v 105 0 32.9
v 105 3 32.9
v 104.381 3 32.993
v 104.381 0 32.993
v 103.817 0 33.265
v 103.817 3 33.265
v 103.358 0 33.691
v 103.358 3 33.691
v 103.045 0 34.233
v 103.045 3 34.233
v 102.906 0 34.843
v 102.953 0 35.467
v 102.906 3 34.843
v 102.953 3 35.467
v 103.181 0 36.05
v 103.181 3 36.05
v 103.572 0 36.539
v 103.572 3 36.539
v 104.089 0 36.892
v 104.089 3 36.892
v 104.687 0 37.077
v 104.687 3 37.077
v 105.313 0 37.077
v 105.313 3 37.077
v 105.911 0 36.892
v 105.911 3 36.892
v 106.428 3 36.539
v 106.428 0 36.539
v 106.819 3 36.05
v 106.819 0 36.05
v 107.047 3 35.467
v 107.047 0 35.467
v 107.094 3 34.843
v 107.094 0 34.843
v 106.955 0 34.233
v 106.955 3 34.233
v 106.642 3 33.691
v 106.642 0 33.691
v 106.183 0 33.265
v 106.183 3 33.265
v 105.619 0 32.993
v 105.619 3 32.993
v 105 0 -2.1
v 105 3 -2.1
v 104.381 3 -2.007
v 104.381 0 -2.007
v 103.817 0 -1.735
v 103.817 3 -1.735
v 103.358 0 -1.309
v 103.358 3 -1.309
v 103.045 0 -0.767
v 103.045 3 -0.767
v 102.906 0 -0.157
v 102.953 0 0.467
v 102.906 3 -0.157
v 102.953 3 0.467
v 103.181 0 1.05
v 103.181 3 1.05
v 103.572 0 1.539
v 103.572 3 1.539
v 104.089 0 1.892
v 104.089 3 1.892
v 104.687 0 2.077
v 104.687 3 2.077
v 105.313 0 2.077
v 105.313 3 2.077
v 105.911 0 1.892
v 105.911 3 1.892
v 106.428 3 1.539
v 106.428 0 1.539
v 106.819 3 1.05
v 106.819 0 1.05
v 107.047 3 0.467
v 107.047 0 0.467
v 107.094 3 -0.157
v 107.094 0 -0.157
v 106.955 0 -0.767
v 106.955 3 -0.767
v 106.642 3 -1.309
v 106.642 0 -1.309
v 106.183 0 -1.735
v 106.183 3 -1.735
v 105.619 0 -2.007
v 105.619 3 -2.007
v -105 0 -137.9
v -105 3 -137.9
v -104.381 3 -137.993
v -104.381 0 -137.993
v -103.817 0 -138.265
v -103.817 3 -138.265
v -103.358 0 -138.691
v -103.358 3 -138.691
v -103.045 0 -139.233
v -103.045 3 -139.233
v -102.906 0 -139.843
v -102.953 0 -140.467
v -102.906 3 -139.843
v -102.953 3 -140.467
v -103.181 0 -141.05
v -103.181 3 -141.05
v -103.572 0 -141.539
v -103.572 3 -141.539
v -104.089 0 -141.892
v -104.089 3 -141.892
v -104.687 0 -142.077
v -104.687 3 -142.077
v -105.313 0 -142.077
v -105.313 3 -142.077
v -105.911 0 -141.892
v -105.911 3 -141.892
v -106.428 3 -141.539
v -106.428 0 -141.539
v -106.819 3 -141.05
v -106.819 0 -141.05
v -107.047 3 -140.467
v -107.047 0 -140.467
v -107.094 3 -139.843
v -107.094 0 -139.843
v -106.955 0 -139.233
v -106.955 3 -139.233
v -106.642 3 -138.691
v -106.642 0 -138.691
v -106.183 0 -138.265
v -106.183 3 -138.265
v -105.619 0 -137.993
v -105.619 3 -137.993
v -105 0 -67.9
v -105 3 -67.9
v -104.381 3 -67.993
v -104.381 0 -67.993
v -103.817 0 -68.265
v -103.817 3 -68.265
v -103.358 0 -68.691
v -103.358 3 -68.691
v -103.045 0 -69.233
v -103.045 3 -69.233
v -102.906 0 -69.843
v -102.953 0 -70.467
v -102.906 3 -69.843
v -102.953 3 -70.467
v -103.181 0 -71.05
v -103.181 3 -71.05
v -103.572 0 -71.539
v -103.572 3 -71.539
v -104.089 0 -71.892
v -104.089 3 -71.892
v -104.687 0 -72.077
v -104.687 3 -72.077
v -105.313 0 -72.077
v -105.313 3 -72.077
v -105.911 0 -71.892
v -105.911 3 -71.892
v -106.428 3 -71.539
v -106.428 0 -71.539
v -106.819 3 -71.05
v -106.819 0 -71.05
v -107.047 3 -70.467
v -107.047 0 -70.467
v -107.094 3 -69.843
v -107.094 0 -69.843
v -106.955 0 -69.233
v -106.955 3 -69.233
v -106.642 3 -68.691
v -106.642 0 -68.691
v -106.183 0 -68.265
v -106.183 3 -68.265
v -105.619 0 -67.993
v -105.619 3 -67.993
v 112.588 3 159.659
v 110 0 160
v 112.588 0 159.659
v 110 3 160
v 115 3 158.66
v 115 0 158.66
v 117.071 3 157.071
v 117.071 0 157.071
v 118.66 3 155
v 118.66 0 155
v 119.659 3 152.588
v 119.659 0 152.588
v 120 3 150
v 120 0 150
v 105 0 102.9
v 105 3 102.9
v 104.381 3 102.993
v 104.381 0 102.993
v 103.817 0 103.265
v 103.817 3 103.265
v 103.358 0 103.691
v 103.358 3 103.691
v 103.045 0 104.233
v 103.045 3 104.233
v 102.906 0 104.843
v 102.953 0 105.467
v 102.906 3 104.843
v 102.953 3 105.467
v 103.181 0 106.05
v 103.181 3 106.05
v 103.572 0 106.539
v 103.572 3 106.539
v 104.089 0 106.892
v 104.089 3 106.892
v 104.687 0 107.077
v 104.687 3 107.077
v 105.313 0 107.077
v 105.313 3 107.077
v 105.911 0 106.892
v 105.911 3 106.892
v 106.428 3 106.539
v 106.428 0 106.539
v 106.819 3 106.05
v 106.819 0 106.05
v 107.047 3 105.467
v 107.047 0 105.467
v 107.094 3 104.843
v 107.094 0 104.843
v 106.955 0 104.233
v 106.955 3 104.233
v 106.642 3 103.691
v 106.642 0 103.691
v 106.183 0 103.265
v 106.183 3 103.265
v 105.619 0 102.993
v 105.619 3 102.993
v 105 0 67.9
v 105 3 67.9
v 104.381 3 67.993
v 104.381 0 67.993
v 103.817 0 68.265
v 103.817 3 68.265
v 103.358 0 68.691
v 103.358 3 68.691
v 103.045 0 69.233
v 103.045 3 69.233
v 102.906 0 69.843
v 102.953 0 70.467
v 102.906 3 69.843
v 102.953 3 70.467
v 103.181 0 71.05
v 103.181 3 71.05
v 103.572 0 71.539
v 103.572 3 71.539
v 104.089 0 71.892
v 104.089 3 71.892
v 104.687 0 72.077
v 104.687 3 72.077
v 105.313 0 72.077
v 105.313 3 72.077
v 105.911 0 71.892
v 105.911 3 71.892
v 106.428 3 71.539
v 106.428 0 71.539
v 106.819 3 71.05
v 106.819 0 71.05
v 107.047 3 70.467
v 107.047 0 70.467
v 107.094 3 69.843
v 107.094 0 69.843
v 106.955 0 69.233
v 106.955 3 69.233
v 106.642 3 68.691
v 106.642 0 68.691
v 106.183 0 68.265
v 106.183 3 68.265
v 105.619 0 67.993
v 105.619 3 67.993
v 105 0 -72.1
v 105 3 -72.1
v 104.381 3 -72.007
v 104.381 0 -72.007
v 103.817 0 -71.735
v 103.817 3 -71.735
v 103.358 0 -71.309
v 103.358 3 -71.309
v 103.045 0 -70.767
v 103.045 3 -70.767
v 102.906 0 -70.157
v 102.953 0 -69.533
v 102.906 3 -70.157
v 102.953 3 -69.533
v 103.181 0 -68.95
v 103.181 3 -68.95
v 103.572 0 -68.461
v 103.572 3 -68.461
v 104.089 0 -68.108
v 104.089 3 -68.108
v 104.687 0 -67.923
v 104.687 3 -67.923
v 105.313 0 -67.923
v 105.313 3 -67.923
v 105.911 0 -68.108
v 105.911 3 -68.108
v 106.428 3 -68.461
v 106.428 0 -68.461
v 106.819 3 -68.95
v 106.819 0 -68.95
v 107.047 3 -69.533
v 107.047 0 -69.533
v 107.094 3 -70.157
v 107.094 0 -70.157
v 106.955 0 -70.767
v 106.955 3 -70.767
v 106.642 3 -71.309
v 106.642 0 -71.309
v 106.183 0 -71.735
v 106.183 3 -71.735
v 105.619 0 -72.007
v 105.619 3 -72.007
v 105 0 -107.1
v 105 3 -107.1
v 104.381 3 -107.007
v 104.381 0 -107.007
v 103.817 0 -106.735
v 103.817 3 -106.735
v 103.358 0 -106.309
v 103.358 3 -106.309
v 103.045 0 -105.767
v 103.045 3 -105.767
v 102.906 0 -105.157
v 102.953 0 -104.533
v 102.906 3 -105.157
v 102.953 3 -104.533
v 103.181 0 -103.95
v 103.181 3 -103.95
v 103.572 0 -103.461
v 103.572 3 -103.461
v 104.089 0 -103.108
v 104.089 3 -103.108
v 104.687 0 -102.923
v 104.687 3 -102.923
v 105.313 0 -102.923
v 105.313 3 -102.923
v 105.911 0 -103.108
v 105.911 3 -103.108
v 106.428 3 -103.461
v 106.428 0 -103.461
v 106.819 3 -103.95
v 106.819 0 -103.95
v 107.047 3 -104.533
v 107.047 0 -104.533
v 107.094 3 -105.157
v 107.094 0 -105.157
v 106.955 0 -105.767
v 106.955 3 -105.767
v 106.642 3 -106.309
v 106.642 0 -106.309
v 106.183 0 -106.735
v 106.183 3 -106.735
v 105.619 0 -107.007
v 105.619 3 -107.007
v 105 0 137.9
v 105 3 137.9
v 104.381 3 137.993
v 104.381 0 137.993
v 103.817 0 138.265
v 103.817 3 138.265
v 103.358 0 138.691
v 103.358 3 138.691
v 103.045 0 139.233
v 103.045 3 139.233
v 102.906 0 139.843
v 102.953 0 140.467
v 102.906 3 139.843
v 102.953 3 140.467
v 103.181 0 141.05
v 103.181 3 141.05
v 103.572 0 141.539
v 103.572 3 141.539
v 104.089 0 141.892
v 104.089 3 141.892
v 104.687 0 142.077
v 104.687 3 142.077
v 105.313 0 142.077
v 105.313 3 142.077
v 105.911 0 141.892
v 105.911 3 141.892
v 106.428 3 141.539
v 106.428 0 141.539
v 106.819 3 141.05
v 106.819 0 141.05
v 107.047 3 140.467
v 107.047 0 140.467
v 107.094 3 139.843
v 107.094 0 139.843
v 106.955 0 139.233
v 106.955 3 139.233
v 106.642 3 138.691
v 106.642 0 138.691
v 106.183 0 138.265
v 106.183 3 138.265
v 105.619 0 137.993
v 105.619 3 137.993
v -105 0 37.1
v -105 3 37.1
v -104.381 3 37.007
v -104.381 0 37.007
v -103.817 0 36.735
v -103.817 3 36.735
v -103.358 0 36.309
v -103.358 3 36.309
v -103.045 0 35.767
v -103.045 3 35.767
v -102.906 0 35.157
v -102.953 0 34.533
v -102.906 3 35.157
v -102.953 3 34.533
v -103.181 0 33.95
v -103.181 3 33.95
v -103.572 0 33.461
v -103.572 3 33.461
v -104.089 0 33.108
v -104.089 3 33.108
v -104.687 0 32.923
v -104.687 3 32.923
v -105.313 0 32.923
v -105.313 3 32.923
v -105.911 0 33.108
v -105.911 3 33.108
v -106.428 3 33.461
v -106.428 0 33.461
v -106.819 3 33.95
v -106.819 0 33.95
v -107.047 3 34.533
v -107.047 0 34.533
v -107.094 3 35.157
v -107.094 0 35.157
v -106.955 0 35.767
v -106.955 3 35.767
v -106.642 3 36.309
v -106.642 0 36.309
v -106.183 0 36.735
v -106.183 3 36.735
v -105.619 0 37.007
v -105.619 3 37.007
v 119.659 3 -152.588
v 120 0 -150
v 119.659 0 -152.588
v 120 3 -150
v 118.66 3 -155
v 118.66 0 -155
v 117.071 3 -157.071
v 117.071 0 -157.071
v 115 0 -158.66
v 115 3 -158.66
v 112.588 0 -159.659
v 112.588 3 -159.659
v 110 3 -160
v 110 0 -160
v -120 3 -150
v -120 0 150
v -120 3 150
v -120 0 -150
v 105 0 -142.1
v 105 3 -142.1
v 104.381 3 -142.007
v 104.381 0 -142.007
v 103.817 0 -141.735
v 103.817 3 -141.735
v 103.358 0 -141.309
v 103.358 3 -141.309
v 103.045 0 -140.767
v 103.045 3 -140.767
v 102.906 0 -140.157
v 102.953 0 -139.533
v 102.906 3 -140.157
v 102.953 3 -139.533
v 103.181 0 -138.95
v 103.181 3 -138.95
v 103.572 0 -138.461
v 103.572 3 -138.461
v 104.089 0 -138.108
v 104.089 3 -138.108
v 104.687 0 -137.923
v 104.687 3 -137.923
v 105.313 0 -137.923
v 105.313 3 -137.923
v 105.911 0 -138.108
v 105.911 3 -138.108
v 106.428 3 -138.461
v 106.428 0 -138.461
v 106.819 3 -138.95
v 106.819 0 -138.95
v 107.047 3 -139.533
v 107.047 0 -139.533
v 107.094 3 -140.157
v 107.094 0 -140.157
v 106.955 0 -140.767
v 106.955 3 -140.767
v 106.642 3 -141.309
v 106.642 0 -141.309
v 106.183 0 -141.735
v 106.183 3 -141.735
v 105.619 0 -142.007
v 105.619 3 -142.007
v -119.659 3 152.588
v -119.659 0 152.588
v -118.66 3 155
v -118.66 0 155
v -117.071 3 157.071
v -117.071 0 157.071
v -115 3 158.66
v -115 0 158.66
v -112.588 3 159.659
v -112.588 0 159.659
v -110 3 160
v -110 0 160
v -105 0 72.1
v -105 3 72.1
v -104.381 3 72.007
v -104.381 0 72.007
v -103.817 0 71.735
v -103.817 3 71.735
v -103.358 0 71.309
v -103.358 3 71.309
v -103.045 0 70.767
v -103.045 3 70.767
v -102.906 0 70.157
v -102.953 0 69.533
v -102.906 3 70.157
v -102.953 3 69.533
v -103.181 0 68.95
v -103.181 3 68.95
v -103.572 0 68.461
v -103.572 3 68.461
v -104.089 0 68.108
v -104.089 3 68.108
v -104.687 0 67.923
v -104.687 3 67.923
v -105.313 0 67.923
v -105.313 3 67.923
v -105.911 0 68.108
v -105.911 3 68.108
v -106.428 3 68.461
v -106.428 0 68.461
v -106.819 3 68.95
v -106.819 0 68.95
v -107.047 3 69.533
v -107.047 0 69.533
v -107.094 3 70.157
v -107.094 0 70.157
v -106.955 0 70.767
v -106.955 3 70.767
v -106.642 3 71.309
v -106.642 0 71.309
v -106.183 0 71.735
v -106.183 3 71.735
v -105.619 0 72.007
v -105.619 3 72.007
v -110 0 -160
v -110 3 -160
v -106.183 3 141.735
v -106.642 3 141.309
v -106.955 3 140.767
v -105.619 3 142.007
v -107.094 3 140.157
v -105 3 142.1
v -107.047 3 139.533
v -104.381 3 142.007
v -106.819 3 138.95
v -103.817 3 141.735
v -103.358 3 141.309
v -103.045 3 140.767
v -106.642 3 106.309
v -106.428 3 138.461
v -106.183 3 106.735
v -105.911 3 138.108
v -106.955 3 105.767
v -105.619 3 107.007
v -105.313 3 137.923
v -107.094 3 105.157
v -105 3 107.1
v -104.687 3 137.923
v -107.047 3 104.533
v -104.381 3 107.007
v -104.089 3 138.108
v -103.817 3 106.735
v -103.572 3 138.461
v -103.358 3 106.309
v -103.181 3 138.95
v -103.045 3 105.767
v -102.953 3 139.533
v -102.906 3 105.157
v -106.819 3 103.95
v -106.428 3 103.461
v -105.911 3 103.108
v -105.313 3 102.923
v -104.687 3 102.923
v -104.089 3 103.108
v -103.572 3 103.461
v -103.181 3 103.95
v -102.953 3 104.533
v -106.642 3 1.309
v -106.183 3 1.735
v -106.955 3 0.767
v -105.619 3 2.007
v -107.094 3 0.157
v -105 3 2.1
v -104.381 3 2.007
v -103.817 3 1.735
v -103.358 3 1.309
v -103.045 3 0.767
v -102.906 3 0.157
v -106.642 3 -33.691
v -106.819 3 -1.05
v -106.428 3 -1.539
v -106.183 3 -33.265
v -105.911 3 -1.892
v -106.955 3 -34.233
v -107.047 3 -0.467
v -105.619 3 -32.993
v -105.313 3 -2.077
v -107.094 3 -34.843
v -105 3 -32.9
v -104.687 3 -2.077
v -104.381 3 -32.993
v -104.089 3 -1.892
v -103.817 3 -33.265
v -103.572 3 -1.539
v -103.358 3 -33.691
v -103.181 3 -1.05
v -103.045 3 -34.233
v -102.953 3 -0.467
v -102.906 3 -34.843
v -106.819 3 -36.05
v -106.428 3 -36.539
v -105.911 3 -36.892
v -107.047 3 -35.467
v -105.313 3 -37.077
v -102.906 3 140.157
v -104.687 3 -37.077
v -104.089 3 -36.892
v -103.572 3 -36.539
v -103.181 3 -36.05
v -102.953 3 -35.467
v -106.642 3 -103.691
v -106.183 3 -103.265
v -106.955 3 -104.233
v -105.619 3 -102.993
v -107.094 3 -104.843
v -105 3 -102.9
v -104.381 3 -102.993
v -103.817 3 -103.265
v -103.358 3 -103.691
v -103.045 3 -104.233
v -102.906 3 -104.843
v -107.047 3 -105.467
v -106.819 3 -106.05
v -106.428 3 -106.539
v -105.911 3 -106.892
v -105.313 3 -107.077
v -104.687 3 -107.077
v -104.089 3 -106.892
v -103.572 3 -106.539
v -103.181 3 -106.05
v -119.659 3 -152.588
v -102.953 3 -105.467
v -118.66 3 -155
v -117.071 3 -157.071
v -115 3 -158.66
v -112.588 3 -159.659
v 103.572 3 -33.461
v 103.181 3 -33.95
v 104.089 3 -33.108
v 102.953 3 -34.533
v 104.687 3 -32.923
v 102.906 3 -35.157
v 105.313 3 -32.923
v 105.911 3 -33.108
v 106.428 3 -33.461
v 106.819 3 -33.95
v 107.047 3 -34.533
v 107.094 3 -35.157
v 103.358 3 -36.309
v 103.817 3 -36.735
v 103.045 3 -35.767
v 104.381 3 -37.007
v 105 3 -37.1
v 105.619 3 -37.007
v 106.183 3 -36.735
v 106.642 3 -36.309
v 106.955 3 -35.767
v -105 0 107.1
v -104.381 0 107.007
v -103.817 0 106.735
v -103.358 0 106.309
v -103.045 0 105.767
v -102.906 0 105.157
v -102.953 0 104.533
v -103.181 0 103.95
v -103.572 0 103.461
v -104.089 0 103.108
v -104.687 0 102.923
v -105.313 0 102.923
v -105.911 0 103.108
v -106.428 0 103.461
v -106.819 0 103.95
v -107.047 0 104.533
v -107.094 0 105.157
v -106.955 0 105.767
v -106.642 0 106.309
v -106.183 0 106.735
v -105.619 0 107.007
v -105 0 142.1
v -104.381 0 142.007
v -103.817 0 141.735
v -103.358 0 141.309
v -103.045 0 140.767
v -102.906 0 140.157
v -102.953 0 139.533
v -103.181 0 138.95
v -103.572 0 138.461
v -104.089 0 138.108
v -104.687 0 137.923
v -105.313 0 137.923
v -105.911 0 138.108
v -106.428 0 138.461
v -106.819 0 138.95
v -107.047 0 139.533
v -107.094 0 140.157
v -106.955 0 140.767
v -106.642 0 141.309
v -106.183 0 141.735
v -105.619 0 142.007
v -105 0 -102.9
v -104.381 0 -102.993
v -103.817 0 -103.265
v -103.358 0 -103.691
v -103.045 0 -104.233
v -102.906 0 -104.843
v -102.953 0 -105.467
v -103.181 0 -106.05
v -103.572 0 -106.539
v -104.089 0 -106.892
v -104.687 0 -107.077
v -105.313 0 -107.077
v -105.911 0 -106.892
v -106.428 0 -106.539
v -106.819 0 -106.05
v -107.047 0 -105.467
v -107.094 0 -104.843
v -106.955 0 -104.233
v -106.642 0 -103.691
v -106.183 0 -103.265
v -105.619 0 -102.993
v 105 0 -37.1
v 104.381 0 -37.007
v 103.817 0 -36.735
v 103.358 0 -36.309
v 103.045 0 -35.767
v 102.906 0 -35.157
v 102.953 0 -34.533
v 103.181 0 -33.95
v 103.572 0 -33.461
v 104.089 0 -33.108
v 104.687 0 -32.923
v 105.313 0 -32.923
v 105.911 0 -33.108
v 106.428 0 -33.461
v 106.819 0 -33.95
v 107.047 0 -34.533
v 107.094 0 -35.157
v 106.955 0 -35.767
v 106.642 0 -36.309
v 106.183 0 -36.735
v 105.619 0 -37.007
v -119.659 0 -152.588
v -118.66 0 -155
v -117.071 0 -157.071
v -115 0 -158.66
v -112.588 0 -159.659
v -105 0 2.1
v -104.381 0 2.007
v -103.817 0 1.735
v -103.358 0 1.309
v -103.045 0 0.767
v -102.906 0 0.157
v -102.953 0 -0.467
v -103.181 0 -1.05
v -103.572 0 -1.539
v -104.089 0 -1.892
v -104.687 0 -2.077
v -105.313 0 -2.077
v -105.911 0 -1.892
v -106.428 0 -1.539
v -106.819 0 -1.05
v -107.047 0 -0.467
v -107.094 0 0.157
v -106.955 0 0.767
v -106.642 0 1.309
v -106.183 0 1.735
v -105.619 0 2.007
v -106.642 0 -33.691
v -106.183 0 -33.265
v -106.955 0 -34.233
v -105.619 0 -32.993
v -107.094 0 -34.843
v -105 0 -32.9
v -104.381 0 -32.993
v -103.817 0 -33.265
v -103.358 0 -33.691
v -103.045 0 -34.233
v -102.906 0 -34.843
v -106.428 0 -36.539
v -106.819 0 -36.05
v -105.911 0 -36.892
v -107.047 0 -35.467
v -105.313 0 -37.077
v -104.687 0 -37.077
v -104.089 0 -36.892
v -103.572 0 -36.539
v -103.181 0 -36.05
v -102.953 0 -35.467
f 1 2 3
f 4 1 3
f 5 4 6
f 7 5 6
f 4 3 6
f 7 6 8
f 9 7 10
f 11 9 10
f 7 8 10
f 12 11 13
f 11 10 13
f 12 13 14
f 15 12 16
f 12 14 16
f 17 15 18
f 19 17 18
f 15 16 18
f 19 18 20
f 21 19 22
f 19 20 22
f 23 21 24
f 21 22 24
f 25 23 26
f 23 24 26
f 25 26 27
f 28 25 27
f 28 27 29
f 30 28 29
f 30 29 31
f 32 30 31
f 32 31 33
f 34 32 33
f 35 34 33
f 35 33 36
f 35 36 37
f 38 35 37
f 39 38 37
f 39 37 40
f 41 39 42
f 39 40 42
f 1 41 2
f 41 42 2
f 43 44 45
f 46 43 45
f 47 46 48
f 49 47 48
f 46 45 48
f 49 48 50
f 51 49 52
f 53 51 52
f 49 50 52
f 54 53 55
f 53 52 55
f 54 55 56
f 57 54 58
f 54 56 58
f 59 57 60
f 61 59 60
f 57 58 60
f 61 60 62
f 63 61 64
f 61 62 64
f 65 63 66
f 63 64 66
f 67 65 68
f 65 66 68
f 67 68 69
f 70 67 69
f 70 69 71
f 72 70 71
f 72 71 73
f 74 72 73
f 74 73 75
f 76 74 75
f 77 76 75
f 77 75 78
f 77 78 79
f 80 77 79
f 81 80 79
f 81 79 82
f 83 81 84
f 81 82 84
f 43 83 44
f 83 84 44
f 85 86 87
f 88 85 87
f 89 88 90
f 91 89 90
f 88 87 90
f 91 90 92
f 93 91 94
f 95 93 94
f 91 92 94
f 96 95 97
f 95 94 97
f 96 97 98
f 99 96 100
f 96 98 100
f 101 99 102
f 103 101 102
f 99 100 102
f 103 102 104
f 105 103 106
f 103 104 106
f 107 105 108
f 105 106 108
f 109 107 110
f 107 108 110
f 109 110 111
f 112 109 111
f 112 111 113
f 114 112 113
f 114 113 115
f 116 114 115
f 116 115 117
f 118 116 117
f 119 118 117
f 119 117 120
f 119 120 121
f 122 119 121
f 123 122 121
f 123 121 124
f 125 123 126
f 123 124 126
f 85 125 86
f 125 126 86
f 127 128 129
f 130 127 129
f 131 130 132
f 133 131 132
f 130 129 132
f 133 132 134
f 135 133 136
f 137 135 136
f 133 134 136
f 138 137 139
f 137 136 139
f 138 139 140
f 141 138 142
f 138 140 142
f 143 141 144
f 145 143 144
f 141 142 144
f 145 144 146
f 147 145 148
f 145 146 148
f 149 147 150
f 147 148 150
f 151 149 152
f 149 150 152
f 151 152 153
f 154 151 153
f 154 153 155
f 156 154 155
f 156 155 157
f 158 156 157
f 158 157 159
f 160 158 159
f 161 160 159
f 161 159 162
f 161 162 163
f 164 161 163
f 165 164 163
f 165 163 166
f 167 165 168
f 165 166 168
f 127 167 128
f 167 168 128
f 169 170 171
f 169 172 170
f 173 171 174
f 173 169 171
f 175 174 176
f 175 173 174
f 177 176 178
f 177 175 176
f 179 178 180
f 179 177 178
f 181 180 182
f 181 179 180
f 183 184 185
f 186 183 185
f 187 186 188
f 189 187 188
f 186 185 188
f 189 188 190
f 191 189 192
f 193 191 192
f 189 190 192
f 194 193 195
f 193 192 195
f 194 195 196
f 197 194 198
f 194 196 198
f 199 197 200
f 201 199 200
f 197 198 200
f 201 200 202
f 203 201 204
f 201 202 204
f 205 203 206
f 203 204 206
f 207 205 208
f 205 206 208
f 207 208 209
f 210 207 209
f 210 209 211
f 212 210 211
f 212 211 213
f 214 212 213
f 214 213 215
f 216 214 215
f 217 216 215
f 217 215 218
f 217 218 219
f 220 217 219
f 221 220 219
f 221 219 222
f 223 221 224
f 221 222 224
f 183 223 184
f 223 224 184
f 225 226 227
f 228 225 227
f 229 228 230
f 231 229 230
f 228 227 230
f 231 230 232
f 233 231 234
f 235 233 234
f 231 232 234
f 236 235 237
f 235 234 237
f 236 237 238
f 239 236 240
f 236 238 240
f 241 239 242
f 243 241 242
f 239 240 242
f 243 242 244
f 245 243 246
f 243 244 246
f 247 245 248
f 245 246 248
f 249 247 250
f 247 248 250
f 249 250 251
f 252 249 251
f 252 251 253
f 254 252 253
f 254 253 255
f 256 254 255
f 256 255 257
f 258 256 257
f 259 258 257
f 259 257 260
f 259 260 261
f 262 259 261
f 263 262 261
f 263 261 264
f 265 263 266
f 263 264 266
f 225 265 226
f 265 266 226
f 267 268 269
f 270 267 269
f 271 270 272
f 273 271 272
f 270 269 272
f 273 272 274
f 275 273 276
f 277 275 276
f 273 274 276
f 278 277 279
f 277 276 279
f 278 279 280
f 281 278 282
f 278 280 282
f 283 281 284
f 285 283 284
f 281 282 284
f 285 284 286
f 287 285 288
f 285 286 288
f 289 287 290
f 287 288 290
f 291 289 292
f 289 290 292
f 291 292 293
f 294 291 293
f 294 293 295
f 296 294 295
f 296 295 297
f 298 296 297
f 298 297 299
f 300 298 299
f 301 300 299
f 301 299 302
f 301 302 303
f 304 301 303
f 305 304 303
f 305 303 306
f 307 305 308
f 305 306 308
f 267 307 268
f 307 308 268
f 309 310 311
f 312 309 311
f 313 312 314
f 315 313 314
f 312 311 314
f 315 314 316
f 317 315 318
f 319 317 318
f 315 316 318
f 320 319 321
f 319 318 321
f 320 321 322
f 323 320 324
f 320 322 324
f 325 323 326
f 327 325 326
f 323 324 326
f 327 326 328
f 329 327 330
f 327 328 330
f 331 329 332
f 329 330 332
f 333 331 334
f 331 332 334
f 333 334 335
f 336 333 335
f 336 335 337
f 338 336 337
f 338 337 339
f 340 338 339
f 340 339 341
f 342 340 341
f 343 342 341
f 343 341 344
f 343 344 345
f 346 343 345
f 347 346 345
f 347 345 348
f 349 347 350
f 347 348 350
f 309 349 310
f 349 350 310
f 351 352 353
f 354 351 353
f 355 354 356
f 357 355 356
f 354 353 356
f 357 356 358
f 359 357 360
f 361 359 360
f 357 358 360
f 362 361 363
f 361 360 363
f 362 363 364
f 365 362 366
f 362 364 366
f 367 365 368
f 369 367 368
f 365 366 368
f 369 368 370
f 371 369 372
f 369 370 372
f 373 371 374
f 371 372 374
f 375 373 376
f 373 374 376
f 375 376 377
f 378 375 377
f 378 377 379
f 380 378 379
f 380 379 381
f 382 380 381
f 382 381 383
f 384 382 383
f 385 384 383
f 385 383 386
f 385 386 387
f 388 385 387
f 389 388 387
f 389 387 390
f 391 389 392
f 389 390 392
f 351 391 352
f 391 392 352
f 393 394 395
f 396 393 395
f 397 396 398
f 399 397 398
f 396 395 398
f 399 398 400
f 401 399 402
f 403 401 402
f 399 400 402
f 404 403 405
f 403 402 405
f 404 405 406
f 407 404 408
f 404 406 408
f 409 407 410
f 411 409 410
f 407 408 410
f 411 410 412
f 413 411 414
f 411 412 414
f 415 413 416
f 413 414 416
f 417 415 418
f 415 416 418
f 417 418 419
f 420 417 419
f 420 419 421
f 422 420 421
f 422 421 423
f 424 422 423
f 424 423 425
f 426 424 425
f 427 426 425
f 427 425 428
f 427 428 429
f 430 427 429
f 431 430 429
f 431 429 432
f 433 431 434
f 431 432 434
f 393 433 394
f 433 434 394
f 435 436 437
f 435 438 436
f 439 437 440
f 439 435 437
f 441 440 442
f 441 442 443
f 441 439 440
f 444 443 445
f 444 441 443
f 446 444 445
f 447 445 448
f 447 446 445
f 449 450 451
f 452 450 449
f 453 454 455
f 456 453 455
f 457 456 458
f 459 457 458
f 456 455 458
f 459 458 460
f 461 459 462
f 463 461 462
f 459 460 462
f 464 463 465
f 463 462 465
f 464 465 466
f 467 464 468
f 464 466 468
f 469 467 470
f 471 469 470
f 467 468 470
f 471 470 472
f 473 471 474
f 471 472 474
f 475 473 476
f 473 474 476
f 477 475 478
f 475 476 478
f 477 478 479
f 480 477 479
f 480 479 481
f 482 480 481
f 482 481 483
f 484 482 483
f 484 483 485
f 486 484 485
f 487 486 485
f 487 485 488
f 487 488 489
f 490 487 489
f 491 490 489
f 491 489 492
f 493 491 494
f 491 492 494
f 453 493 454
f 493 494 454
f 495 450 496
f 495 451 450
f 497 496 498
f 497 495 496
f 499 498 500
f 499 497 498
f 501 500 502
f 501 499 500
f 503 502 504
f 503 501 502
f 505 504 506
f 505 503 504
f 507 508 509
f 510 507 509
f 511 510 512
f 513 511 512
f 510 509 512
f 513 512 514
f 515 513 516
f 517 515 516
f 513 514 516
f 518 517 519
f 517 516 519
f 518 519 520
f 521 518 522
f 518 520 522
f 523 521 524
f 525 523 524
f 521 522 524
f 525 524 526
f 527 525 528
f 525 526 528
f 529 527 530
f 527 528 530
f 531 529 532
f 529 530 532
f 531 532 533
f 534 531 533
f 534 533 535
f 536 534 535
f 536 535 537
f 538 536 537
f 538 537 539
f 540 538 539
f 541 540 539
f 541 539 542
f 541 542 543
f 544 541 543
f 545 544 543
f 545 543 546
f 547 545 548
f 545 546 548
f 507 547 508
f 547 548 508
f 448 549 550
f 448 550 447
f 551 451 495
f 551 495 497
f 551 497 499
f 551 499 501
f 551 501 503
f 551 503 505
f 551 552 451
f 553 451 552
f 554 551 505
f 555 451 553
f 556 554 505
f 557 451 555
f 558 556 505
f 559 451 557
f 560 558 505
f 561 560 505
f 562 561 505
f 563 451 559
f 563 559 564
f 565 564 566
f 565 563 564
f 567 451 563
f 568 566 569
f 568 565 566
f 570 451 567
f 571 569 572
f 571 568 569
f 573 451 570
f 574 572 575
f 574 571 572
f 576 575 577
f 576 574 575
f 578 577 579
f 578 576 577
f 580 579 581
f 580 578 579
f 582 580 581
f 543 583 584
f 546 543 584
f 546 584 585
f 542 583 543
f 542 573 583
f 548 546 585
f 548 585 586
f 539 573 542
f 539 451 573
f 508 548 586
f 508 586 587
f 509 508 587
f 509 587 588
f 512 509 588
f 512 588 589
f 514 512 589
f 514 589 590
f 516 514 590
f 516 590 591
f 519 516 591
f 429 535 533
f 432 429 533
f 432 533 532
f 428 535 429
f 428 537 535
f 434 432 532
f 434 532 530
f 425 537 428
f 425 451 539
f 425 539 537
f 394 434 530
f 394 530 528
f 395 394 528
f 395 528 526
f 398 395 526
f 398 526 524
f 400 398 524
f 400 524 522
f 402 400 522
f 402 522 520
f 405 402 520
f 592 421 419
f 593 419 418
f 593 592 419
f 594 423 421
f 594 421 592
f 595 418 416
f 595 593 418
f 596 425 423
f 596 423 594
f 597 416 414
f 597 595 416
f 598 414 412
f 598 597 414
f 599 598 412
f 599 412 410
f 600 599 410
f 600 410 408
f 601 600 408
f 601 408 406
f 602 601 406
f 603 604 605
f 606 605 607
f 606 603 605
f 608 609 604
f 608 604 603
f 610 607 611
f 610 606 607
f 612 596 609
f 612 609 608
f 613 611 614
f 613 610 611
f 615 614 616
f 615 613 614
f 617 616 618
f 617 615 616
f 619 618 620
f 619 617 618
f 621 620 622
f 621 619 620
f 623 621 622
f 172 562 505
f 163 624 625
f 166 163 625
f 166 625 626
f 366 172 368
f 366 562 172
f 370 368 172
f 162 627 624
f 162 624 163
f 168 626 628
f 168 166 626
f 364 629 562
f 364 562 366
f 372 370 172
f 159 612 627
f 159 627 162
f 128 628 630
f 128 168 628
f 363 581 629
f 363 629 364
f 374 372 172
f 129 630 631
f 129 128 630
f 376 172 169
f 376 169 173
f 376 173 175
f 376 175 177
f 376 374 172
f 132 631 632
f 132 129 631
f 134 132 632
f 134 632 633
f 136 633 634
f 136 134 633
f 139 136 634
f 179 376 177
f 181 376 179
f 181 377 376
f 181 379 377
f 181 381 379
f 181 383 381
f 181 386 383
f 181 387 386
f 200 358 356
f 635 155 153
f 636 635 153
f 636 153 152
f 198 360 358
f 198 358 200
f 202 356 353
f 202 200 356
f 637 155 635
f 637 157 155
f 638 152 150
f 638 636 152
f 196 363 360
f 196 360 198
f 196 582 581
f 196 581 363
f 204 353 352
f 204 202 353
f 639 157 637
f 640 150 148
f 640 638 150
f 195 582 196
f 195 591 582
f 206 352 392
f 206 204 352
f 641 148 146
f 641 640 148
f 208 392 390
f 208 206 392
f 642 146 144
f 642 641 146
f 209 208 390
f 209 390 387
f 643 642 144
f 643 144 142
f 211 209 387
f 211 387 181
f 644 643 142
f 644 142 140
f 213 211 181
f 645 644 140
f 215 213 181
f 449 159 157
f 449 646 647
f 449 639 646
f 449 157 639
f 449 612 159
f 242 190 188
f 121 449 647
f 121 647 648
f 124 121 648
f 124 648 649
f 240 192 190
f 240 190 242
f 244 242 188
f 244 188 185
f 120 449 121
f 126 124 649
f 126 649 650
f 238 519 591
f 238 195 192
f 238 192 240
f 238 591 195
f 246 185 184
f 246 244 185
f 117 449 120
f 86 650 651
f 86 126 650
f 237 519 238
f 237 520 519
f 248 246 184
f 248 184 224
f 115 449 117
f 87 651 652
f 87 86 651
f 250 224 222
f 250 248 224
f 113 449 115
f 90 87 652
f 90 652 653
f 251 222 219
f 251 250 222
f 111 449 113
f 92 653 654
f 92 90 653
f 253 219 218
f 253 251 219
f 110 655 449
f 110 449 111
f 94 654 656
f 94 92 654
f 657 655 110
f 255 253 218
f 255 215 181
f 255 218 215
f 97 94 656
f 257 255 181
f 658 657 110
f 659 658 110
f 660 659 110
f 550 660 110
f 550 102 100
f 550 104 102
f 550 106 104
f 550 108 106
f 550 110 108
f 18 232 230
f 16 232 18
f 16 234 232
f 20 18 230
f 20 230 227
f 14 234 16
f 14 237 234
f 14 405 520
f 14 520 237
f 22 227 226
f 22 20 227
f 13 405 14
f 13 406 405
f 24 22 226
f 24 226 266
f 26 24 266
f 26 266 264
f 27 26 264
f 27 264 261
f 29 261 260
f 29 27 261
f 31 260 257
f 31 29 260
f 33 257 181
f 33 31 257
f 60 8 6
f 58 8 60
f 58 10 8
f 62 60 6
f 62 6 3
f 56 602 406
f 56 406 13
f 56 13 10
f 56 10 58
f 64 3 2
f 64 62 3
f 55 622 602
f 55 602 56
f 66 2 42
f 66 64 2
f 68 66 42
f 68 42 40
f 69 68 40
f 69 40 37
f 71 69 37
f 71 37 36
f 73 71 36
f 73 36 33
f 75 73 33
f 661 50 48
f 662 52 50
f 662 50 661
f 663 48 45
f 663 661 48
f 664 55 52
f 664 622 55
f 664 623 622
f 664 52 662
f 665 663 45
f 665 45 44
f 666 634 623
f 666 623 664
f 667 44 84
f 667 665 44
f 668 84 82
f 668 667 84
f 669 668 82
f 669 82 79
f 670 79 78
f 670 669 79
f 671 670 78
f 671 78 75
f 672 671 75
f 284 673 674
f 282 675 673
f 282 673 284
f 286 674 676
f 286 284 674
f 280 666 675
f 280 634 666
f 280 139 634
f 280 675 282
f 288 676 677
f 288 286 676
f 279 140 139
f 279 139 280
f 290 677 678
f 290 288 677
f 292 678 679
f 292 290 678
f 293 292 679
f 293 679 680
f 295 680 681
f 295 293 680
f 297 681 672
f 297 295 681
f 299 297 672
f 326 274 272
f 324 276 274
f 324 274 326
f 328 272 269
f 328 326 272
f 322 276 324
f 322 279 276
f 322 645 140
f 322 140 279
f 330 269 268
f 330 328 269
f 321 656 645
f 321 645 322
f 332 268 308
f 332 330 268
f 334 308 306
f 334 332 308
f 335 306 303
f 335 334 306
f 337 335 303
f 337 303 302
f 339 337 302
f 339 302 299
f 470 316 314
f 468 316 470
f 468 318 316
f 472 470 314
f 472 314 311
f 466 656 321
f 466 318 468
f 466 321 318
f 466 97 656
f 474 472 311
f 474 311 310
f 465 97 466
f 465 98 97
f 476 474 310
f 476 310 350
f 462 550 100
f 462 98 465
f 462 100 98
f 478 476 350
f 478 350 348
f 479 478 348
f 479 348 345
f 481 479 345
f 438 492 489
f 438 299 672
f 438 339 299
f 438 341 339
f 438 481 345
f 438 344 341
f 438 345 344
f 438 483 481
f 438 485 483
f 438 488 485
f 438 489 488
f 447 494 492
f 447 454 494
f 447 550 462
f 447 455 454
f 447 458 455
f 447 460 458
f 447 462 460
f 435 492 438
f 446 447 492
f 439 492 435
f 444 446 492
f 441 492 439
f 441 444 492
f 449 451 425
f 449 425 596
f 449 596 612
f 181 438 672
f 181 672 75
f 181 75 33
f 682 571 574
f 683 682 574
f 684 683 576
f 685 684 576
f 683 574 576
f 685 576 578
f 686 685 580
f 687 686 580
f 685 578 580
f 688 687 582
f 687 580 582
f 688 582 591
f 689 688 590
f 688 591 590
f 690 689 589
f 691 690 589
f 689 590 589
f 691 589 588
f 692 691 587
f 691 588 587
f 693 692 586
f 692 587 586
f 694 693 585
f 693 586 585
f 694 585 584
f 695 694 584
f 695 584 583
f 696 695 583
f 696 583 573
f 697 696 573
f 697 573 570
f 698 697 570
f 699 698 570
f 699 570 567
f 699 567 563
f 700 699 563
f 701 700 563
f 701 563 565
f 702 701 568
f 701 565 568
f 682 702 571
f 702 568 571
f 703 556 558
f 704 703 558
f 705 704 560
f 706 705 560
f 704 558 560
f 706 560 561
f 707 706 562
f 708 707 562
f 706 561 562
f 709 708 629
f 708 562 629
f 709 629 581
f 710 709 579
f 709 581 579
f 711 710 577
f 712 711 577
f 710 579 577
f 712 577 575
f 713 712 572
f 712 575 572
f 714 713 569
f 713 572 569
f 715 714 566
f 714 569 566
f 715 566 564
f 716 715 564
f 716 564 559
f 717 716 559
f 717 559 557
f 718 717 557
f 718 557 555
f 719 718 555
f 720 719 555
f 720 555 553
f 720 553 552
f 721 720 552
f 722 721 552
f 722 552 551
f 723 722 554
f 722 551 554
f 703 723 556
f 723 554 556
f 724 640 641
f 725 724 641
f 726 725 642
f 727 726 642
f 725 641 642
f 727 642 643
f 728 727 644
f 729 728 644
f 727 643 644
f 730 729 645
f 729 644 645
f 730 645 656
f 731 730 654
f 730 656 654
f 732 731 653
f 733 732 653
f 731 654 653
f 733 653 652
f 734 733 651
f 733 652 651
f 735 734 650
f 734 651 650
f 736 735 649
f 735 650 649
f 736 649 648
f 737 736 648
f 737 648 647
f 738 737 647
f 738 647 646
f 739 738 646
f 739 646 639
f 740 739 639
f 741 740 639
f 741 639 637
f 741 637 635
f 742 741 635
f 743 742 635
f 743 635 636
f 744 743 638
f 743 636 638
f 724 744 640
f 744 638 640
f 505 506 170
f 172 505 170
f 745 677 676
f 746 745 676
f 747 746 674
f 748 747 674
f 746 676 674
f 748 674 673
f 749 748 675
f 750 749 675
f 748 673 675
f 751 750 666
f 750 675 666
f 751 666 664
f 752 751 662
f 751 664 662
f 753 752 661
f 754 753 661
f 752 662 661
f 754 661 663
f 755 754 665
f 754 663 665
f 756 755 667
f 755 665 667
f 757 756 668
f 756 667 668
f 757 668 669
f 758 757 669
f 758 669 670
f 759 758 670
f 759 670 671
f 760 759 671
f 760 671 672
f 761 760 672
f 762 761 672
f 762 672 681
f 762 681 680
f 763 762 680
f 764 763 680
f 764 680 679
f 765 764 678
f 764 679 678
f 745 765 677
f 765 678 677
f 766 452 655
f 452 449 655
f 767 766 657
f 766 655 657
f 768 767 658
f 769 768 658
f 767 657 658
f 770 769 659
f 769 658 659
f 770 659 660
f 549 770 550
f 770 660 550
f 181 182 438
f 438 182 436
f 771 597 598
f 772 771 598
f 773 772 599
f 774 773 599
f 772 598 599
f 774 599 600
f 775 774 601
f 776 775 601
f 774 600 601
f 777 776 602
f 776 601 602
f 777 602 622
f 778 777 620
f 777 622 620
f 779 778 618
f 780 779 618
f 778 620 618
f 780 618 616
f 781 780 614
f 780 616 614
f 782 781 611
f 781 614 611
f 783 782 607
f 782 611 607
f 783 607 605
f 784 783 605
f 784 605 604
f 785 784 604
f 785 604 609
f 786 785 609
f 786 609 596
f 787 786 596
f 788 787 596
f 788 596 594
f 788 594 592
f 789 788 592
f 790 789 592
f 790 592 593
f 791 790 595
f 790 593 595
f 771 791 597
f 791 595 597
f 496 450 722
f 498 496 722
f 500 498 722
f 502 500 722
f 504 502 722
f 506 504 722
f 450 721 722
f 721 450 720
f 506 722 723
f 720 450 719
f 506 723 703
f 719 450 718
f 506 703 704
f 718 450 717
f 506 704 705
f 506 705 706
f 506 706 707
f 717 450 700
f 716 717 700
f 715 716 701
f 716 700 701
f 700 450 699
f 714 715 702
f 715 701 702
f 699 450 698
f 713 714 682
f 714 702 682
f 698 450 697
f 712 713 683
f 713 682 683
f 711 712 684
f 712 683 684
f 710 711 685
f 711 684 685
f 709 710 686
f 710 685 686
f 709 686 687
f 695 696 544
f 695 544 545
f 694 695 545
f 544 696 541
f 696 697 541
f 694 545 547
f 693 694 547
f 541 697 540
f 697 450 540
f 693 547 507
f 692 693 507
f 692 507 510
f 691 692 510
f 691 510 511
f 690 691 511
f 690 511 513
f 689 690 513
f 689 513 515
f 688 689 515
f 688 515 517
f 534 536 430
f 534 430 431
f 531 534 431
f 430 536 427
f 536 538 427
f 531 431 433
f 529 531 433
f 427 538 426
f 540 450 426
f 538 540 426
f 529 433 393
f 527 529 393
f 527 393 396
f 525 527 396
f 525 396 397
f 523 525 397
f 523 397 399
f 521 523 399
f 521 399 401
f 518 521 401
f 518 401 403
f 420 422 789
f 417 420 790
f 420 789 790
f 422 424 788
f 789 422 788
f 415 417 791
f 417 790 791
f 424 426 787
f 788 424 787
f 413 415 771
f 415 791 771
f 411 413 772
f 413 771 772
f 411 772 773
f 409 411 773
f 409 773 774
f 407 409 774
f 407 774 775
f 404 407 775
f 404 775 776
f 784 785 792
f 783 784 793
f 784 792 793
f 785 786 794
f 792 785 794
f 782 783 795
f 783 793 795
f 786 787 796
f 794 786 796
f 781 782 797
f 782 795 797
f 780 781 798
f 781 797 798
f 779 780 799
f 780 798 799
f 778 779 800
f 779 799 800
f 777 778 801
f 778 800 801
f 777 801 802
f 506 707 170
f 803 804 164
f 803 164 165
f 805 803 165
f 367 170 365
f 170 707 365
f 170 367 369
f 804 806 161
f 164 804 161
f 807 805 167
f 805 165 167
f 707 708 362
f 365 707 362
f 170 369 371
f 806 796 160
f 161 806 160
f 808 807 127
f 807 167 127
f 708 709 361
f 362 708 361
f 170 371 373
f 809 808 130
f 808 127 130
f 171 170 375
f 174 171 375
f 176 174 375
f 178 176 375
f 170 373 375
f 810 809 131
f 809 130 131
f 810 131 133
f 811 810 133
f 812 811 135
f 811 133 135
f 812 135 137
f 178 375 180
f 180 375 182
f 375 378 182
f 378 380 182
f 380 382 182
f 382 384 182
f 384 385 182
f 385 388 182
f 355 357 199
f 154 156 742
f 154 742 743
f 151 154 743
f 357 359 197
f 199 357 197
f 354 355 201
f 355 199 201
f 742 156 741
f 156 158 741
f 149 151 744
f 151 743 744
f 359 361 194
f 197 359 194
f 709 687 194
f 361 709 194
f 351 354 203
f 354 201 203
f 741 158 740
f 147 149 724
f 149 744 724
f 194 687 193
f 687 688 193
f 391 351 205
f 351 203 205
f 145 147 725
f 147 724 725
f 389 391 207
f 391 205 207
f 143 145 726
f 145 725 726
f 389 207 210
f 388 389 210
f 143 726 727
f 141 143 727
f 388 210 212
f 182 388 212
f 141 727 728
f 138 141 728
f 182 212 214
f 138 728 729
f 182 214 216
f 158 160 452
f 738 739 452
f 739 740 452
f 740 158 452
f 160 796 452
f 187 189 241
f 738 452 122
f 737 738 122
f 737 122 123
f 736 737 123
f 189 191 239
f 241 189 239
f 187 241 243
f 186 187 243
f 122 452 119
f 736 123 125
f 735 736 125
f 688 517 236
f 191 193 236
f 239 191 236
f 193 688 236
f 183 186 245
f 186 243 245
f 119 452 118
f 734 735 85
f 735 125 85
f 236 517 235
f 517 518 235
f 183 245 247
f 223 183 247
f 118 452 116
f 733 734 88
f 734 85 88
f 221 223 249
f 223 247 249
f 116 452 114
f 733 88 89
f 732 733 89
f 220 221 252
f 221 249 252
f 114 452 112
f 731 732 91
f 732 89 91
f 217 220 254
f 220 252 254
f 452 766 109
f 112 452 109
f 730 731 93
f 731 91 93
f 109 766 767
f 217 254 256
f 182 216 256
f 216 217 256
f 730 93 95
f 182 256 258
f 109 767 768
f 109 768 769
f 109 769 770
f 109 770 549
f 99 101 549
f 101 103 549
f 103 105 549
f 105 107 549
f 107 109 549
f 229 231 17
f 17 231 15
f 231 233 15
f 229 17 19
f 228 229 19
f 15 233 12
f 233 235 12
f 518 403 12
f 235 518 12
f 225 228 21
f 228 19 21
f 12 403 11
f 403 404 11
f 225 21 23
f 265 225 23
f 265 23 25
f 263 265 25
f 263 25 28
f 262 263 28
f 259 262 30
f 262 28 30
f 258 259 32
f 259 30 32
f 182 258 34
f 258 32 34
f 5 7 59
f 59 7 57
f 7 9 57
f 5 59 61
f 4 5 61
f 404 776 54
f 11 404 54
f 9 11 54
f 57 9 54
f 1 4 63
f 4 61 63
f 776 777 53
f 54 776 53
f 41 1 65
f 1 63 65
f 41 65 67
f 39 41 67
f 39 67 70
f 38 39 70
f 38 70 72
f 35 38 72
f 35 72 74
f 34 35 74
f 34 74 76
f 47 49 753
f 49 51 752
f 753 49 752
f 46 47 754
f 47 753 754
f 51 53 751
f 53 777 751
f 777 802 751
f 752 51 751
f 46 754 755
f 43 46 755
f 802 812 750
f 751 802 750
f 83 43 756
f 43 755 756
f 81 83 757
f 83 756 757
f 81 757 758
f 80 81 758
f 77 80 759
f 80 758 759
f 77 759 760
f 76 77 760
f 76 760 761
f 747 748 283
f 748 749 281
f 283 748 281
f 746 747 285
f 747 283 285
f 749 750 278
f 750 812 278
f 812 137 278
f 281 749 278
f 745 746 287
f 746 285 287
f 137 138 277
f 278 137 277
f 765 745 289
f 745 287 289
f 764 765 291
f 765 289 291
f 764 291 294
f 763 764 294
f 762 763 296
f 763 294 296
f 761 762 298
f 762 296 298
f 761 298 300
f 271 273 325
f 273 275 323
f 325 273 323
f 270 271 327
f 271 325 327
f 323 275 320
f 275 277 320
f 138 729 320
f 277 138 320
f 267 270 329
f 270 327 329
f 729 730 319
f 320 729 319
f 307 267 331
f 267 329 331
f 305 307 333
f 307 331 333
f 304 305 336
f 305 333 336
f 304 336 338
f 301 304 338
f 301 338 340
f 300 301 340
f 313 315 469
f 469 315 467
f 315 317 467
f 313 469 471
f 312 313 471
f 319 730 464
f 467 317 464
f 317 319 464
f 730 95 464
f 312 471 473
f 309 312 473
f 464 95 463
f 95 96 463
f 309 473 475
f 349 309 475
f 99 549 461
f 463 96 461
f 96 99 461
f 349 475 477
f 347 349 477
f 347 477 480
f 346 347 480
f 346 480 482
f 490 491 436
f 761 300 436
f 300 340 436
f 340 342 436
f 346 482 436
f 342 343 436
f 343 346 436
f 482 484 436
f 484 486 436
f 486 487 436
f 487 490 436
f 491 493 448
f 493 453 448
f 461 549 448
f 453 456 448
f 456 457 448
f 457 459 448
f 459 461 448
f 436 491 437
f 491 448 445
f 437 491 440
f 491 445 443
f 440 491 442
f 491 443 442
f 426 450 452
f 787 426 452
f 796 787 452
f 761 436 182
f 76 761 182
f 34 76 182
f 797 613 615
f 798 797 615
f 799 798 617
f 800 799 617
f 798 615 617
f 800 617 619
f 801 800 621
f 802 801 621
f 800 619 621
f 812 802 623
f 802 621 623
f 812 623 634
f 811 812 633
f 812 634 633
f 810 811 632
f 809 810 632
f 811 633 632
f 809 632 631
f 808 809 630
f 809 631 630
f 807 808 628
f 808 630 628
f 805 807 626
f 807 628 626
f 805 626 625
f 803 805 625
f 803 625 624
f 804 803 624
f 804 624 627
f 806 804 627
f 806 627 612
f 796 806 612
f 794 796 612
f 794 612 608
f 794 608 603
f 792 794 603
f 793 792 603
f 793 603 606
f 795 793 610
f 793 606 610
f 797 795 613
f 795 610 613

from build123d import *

# Parameters (mm, degrees)
SKETCH_1_W          = 240
SKETCH_1_H          = 320
EXTRUDE_1_DEPTH     = 3
FILLET_1_R          = 10
SKETCH_2_R          = 2.1
CUT_EXTRUDE_1_DEPTH = 3


with BuildPart() as part:
    # 草图1 → 凸台-拉伸1 (new body)
    with BuildSketch(Plane(origin=(0, 0, 0), x_dir=(1, 0, 0), z_dir=(0, 1, 0))):
        Rectangle(SKETCH_1_W, SKETCH_1_H)
    extrude(amount=EXTRUDE_1_DEPTH)

    # 圆角1
    fillet_1_edges = [part.edges().sort_by_distance(p)[0] for p in [
        (120, 1.5, 160),
        (-120, 1.5, 160),
        (-120, 1.5, -160),
        (120, 1.5, -160),
    ]]
    fillet(fillet_1_edges, radius=FILLET_1_R)

    # 草图2 → 切除-拉伸1 (cut)
    with BuildSketch(Plane(origin=(0, 3, 0), x_dir=(1, 0, 0), z_dir=(0, 1, 0))):
        with Locations(Location((-105, 140, 0), (0, 0, 270))):
            Circle(SKETCH_2_R)
        with Locations(Location((-105, 105, 0), (0, 0, 270))):
            Circle(SKETCH_2_R)
        with Locations(Location((-105, 70, 0), (0, 0, 270))):
            Circle(SKETCH_2_R)
        with Locations(Location((-105, 35, 0), (0, 0, 270))):
            Circle(SKETCH_2_R)
        with Locations(Location((-105, 0, 0), (0, 0, 270))):
            Circle(SKETCH_2_R)
        with Locations(Location((-105, -35, 0), (0, 0, 270))):
            Circle(SKETCH_2_R)
        with Locations(Location((-105, -70, 0), (0, 0, 270))):
            Circle(SKETCH_2_R)
        with Locations(Location((-105, -105, 0), (0, 0, 270))):
            Circle(SKETCH_2_R)
        with Locations(Location((-105, -140, 0), (0, 0, 270))):
            Circle(SKETCH_2_R)
        with Locations(Location((105, -140, 0), (0, 0, 90))):
            Circle(SKETCH_2_R)
        with Locations(Location((105, -105, 0), (0, 0, 90))):
            Circle(SKETCH_2_R)
        with Locations(Location((105, -70, 0), (0, 0, 90))):
            Circle(SKETCH_2_R)
        with Locations(Location((105, -35, 0), (0, 0, 90))):
            Circle(SKETCH_2_R)
        with Locations(Location((105, 0, 0), (0, 0, 90))):
            Circle(SKETCH_2_R)
        with Locations(Location((105, 35, 0), (0, 0, 90))):
            Circle(SKETCH_2_R)
        with Locations(Location((105, 70, 0), (0, 0, 90))):
            Circle(SKETCH_2_R)
        with Locations(Location((105, 105, 0), (0, 0, 90))):
            Circle(SKETCH_2_R)
        with Locations(Location((105, 140, 0), (0, 0, 90))):
            Circle(SKETCH_2_R)
    extrude(amount=-CUT_EXTRUDE_1_DEPTH, mode=Mode.SUBTRACT)


solid = part.part
